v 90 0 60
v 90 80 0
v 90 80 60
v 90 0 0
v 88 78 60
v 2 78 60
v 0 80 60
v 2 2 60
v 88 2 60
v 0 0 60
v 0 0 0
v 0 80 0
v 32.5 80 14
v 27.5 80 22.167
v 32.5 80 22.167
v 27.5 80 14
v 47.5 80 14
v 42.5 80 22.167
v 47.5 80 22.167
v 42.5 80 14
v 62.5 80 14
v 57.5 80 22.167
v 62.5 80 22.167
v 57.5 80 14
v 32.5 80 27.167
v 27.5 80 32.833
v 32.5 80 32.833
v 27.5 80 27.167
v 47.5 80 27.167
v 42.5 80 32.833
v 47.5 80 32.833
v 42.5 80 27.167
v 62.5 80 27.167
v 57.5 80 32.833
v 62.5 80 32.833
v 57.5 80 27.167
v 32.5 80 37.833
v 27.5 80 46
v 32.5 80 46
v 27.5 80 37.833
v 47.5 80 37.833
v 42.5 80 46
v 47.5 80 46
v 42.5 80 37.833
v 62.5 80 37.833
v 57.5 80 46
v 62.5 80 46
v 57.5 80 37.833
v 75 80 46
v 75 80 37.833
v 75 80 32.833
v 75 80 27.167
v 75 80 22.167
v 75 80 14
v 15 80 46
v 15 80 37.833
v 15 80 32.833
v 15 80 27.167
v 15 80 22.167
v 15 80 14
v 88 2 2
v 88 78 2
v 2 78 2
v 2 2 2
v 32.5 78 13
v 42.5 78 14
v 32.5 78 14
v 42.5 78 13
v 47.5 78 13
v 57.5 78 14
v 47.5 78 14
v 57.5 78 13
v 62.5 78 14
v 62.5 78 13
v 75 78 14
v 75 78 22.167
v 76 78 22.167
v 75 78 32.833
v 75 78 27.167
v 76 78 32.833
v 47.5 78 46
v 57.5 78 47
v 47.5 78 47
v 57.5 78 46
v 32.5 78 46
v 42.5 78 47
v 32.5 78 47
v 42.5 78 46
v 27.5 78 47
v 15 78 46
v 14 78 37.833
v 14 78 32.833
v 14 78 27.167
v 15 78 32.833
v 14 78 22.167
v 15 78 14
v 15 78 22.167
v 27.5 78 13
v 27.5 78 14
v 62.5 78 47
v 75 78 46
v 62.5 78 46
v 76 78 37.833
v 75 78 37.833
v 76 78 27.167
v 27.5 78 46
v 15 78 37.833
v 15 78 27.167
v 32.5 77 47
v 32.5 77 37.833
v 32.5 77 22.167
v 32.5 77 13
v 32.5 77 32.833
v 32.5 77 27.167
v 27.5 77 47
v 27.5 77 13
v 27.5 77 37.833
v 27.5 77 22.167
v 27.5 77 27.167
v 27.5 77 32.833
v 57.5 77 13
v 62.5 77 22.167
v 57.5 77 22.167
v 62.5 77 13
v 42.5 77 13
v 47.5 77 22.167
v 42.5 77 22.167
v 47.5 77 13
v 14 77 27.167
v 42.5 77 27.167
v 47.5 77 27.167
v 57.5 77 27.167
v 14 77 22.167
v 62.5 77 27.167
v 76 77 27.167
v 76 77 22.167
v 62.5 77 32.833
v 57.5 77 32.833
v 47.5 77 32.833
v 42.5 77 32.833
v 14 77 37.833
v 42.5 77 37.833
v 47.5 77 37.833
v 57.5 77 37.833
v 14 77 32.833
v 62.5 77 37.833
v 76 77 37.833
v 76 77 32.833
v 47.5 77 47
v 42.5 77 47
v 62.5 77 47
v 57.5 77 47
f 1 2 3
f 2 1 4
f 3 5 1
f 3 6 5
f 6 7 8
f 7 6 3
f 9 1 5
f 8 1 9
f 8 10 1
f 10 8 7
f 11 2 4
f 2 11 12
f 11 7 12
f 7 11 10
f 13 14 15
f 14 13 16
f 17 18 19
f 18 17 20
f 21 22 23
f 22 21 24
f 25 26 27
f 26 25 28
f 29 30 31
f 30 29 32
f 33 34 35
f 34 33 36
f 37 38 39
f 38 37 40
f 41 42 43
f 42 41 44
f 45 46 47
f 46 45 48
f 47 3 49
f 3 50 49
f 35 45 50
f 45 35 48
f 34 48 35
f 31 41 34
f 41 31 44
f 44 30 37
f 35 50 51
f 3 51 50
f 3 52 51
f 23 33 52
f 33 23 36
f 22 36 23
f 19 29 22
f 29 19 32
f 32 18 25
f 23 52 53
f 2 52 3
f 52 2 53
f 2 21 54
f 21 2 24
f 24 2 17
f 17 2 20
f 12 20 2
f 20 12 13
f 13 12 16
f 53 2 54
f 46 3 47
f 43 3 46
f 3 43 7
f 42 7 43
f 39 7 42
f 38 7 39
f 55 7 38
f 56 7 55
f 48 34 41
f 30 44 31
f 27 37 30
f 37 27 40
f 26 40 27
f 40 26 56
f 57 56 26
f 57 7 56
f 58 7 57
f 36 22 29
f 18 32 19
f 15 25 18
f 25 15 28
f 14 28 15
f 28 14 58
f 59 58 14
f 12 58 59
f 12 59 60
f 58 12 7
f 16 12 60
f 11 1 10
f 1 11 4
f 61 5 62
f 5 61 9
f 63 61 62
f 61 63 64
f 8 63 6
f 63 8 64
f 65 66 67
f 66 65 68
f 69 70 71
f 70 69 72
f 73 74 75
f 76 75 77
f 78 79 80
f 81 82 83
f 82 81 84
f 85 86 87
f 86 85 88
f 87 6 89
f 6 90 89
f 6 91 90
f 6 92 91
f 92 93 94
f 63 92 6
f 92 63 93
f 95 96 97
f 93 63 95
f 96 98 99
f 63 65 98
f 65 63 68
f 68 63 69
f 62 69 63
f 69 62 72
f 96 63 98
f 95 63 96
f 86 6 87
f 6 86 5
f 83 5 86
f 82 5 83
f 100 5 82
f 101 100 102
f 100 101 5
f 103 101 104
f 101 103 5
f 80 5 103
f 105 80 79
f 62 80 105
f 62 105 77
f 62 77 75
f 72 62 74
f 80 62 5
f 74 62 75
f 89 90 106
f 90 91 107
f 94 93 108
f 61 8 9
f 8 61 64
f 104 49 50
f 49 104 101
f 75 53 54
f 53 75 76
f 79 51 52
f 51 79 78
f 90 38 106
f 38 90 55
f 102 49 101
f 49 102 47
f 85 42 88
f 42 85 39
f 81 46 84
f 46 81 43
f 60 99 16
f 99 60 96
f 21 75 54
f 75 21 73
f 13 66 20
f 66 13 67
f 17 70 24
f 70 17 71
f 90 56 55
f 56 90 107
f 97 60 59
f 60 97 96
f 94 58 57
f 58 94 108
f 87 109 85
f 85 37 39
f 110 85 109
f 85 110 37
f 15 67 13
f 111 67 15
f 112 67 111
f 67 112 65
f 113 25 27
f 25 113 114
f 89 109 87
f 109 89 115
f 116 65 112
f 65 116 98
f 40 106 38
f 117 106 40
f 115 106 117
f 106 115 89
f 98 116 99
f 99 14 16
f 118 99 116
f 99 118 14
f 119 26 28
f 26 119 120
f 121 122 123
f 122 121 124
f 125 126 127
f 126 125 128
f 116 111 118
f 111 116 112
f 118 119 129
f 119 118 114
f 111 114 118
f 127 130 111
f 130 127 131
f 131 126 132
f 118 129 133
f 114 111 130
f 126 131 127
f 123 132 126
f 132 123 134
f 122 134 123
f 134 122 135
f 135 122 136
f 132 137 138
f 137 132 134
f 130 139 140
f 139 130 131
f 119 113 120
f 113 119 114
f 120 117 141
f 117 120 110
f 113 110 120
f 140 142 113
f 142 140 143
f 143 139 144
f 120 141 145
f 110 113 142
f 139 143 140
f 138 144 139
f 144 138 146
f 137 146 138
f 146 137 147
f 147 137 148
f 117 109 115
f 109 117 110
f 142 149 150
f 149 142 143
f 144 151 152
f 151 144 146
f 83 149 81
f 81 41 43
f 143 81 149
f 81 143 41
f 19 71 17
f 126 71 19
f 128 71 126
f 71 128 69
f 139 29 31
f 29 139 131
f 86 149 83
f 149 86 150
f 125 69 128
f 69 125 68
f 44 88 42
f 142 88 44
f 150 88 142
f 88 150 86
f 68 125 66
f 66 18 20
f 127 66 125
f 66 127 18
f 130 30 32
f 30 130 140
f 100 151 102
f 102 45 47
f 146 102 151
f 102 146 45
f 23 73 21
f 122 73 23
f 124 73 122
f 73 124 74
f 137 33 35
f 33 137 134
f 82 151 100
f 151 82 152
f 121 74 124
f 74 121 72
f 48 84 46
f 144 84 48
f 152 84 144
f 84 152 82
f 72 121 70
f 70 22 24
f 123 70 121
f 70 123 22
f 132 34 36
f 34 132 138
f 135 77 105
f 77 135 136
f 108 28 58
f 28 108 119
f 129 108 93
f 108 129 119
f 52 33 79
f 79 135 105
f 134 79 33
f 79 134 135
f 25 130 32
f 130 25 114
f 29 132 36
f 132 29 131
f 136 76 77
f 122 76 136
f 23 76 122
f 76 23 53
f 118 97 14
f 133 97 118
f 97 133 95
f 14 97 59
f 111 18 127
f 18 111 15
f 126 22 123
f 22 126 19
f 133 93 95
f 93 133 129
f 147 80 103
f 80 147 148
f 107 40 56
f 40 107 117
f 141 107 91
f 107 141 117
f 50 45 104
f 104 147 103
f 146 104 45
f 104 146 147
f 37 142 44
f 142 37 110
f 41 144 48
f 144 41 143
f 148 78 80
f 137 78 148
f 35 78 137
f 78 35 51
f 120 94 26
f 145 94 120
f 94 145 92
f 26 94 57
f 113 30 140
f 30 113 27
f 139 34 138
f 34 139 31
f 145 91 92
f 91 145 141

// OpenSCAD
$fn = 32;

// ----------------------------------------------------------------------
// Vent box: crossgrid enclosure
// ----------------------------------------------------------------------

// --- parameters (mm) ---
box_l = 90;               // box length, X
box_w = 80;               // box width, Y
box_h = 60;               // box height, Z
wall_t = 2;               // shell wall thickness
win_l = 60;               // vent window width, X
win_h = 32;               // vent window height, Z
bar_w = 5;                // grid bar width
n_v = 3;                  // vertical bar count
n_h = 2;                  // horizontal bar count

win_z0 = (box_h - win_h) / 2;  // window lower edge Z
v_step = win_l / (n_v + 1);  // vertical bar step
h_step = win_h / (n_h + 1);  // horizontal bar step

difference() {
  union() {
    difference() {
      cube([box_l, box_w, box_h]);
  translate([wall_t, wall_t, wall_t])
    cube([box_l - 2 * wall_t, box_w - 2 * wall_t, box_h]);
  translate([(box_l - win_l) / 2, box_w - wall_t - 1, win_z0])
    cube([win_l, wall_t + 2, win_h]);
    }
    for (i = [1 : n_v])
      translate([(box_l - win_l) / 2 + i * v_step - bar_w / 2,
                 box_w - wall_t - 1, win_z0 - 1])
        cube([bar_w, wall_t + 1, win_h + 2]);
    for (i = [1 : n_h])
      translate([(box_l - win_l) / 2 - 1, box_w - wall_t - 1,
                 win_z0 + i * h_step - bar_w / 2])
        cube([win_l + 2, wall_t + 1, bar_w]);
  }
}
